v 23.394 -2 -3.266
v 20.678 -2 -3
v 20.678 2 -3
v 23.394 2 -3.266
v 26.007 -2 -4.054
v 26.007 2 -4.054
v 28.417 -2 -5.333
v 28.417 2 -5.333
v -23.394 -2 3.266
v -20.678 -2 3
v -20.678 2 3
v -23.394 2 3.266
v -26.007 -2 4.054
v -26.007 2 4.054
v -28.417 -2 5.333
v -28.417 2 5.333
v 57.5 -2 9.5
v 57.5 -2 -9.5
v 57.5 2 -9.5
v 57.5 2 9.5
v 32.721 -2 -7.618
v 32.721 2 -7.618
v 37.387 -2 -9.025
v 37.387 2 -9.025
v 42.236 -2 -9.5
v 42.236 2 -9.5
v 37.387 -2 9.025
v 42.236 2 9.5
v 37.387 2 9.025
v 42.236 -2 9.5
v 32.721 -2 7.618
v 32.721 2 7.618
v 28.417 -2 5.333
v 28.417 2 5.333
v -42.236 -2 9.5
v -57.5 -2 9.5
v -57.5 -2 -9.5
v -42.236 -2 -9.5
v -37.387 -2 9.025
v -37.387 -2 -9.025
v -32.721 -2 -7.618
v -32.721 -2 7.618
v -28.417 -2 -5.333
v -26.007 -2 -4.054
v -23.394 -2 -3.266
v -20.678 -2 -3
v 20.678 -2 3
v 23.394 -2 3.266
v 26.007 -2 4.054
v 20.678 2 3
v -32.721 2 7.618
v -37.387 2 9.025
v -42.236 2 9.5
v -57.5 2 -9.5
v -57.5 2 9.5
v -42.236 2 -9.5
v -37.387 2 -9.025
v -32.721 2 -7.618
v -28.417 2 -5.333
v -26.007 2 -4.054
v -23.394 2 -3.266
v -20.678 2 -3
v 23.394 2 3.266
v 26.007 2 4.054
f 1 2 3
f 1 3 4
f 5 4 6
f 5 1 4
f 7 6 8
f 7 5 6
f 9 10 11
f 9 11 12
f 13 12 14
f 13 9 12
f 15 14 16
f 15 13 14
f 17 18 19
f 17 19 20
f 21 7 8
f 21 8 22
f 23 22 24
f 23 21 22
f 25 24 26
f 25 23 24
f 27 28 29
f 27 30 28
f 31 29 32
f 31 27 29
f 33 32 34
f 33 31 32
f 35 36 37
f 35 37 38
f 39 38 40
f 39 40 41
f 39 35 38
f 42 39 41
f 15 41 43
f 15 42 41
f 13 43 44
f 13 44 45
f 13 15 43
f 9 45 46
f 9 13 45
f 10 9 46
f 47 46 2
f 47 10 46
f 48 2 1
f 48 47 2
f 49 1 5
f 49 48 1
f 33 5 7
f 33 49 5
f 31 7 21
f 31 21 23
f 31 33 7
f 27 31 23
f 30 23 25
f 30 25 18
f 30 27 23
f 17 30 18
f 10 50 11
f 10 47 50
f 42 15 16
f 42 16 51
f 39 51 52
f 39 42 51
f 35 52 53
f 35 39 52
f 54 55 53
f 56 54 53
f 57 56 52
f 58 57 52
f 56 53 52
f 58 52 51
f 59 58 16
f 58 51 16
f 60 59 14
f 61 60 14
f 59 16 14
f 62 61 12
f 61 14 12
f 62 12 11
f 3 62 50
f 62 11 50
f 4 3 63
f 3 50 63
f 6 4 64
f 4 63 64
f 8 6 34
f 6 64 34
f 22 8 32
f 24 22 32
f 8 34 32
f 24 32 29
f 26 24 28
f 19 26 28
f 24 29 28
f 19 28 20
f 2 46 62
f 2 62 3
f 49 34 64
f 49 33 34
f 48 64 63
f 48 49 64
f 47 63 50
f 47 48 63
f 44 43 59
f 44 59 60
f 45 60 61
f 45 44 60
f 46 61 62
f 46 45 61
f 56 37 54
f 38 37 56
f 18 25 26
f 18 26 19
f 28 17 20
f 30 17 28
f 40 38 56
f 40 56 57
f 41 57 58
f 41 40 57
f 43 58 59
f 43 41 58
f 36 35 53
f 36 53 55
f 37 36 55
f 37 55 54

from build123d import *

# Parameters (mm, degrees)
F1_DEPTH = 2


with BuildPart() as f1:
    # F0 (on Front) → F1 (new body, symmetric)
    with BuildSketch(Plane.XZ):
        with BuildLine():
            Line((20.67841, 3), (0, 3))
            Line((0, 3), (-20.67841, 3))
            ThreePointArc((-20.67841, 3), (-24.719861, 3.59602), (-28.417201, 5.333333))
            ThreePointArc((-28.417201, 5.333333), (-35.019592, 8.435678), (-42.236471, 9.5))
            Line((-42.236471, 9.5), (-57.5, 9.5))
            Line((-57.5, 9.5), (-57.5, -9.5))
            Line((-57.5, -9.5), (-42.236471, -9.5))
            ThreePointArc((-42.236471, -9.5), (-35.019592, -8.435678), (-28.417201, -5.333333))
            ThreePointArc((-28.417201, -5.333333), (-24.719861, -3.59602), (-20.67841, -3))
            Line((-20.67841, -3), (0, -3))
            Line((0, -3), (20.67841, -3))
            ThreePointArc((20.67841, -3), (24.719861, -3.59602), (28.417201, -5.333333))
            ThreePointArc((28.417201, -5.333333), (35.019592, -8.435678), (42.236471, -9.5))
            Line((42.236471, -9.5), (57.5, -9.5))
            Line((57.5, -9.5), (57.5, 9.5))
            Line((57.5, 9.5), (42.236471, 9.5))
            ThreePointArc((42.236471, 9.5), (35.019592, 8.435678), (28.417201, 5.333333))
            ThreePointArc((28.417201, 5.333333), (24.719861, 3.59602), (20.67841, 3))
        make_face()
    extrude(amount=F1_DEPTH, both=True)


solid = f1.part
